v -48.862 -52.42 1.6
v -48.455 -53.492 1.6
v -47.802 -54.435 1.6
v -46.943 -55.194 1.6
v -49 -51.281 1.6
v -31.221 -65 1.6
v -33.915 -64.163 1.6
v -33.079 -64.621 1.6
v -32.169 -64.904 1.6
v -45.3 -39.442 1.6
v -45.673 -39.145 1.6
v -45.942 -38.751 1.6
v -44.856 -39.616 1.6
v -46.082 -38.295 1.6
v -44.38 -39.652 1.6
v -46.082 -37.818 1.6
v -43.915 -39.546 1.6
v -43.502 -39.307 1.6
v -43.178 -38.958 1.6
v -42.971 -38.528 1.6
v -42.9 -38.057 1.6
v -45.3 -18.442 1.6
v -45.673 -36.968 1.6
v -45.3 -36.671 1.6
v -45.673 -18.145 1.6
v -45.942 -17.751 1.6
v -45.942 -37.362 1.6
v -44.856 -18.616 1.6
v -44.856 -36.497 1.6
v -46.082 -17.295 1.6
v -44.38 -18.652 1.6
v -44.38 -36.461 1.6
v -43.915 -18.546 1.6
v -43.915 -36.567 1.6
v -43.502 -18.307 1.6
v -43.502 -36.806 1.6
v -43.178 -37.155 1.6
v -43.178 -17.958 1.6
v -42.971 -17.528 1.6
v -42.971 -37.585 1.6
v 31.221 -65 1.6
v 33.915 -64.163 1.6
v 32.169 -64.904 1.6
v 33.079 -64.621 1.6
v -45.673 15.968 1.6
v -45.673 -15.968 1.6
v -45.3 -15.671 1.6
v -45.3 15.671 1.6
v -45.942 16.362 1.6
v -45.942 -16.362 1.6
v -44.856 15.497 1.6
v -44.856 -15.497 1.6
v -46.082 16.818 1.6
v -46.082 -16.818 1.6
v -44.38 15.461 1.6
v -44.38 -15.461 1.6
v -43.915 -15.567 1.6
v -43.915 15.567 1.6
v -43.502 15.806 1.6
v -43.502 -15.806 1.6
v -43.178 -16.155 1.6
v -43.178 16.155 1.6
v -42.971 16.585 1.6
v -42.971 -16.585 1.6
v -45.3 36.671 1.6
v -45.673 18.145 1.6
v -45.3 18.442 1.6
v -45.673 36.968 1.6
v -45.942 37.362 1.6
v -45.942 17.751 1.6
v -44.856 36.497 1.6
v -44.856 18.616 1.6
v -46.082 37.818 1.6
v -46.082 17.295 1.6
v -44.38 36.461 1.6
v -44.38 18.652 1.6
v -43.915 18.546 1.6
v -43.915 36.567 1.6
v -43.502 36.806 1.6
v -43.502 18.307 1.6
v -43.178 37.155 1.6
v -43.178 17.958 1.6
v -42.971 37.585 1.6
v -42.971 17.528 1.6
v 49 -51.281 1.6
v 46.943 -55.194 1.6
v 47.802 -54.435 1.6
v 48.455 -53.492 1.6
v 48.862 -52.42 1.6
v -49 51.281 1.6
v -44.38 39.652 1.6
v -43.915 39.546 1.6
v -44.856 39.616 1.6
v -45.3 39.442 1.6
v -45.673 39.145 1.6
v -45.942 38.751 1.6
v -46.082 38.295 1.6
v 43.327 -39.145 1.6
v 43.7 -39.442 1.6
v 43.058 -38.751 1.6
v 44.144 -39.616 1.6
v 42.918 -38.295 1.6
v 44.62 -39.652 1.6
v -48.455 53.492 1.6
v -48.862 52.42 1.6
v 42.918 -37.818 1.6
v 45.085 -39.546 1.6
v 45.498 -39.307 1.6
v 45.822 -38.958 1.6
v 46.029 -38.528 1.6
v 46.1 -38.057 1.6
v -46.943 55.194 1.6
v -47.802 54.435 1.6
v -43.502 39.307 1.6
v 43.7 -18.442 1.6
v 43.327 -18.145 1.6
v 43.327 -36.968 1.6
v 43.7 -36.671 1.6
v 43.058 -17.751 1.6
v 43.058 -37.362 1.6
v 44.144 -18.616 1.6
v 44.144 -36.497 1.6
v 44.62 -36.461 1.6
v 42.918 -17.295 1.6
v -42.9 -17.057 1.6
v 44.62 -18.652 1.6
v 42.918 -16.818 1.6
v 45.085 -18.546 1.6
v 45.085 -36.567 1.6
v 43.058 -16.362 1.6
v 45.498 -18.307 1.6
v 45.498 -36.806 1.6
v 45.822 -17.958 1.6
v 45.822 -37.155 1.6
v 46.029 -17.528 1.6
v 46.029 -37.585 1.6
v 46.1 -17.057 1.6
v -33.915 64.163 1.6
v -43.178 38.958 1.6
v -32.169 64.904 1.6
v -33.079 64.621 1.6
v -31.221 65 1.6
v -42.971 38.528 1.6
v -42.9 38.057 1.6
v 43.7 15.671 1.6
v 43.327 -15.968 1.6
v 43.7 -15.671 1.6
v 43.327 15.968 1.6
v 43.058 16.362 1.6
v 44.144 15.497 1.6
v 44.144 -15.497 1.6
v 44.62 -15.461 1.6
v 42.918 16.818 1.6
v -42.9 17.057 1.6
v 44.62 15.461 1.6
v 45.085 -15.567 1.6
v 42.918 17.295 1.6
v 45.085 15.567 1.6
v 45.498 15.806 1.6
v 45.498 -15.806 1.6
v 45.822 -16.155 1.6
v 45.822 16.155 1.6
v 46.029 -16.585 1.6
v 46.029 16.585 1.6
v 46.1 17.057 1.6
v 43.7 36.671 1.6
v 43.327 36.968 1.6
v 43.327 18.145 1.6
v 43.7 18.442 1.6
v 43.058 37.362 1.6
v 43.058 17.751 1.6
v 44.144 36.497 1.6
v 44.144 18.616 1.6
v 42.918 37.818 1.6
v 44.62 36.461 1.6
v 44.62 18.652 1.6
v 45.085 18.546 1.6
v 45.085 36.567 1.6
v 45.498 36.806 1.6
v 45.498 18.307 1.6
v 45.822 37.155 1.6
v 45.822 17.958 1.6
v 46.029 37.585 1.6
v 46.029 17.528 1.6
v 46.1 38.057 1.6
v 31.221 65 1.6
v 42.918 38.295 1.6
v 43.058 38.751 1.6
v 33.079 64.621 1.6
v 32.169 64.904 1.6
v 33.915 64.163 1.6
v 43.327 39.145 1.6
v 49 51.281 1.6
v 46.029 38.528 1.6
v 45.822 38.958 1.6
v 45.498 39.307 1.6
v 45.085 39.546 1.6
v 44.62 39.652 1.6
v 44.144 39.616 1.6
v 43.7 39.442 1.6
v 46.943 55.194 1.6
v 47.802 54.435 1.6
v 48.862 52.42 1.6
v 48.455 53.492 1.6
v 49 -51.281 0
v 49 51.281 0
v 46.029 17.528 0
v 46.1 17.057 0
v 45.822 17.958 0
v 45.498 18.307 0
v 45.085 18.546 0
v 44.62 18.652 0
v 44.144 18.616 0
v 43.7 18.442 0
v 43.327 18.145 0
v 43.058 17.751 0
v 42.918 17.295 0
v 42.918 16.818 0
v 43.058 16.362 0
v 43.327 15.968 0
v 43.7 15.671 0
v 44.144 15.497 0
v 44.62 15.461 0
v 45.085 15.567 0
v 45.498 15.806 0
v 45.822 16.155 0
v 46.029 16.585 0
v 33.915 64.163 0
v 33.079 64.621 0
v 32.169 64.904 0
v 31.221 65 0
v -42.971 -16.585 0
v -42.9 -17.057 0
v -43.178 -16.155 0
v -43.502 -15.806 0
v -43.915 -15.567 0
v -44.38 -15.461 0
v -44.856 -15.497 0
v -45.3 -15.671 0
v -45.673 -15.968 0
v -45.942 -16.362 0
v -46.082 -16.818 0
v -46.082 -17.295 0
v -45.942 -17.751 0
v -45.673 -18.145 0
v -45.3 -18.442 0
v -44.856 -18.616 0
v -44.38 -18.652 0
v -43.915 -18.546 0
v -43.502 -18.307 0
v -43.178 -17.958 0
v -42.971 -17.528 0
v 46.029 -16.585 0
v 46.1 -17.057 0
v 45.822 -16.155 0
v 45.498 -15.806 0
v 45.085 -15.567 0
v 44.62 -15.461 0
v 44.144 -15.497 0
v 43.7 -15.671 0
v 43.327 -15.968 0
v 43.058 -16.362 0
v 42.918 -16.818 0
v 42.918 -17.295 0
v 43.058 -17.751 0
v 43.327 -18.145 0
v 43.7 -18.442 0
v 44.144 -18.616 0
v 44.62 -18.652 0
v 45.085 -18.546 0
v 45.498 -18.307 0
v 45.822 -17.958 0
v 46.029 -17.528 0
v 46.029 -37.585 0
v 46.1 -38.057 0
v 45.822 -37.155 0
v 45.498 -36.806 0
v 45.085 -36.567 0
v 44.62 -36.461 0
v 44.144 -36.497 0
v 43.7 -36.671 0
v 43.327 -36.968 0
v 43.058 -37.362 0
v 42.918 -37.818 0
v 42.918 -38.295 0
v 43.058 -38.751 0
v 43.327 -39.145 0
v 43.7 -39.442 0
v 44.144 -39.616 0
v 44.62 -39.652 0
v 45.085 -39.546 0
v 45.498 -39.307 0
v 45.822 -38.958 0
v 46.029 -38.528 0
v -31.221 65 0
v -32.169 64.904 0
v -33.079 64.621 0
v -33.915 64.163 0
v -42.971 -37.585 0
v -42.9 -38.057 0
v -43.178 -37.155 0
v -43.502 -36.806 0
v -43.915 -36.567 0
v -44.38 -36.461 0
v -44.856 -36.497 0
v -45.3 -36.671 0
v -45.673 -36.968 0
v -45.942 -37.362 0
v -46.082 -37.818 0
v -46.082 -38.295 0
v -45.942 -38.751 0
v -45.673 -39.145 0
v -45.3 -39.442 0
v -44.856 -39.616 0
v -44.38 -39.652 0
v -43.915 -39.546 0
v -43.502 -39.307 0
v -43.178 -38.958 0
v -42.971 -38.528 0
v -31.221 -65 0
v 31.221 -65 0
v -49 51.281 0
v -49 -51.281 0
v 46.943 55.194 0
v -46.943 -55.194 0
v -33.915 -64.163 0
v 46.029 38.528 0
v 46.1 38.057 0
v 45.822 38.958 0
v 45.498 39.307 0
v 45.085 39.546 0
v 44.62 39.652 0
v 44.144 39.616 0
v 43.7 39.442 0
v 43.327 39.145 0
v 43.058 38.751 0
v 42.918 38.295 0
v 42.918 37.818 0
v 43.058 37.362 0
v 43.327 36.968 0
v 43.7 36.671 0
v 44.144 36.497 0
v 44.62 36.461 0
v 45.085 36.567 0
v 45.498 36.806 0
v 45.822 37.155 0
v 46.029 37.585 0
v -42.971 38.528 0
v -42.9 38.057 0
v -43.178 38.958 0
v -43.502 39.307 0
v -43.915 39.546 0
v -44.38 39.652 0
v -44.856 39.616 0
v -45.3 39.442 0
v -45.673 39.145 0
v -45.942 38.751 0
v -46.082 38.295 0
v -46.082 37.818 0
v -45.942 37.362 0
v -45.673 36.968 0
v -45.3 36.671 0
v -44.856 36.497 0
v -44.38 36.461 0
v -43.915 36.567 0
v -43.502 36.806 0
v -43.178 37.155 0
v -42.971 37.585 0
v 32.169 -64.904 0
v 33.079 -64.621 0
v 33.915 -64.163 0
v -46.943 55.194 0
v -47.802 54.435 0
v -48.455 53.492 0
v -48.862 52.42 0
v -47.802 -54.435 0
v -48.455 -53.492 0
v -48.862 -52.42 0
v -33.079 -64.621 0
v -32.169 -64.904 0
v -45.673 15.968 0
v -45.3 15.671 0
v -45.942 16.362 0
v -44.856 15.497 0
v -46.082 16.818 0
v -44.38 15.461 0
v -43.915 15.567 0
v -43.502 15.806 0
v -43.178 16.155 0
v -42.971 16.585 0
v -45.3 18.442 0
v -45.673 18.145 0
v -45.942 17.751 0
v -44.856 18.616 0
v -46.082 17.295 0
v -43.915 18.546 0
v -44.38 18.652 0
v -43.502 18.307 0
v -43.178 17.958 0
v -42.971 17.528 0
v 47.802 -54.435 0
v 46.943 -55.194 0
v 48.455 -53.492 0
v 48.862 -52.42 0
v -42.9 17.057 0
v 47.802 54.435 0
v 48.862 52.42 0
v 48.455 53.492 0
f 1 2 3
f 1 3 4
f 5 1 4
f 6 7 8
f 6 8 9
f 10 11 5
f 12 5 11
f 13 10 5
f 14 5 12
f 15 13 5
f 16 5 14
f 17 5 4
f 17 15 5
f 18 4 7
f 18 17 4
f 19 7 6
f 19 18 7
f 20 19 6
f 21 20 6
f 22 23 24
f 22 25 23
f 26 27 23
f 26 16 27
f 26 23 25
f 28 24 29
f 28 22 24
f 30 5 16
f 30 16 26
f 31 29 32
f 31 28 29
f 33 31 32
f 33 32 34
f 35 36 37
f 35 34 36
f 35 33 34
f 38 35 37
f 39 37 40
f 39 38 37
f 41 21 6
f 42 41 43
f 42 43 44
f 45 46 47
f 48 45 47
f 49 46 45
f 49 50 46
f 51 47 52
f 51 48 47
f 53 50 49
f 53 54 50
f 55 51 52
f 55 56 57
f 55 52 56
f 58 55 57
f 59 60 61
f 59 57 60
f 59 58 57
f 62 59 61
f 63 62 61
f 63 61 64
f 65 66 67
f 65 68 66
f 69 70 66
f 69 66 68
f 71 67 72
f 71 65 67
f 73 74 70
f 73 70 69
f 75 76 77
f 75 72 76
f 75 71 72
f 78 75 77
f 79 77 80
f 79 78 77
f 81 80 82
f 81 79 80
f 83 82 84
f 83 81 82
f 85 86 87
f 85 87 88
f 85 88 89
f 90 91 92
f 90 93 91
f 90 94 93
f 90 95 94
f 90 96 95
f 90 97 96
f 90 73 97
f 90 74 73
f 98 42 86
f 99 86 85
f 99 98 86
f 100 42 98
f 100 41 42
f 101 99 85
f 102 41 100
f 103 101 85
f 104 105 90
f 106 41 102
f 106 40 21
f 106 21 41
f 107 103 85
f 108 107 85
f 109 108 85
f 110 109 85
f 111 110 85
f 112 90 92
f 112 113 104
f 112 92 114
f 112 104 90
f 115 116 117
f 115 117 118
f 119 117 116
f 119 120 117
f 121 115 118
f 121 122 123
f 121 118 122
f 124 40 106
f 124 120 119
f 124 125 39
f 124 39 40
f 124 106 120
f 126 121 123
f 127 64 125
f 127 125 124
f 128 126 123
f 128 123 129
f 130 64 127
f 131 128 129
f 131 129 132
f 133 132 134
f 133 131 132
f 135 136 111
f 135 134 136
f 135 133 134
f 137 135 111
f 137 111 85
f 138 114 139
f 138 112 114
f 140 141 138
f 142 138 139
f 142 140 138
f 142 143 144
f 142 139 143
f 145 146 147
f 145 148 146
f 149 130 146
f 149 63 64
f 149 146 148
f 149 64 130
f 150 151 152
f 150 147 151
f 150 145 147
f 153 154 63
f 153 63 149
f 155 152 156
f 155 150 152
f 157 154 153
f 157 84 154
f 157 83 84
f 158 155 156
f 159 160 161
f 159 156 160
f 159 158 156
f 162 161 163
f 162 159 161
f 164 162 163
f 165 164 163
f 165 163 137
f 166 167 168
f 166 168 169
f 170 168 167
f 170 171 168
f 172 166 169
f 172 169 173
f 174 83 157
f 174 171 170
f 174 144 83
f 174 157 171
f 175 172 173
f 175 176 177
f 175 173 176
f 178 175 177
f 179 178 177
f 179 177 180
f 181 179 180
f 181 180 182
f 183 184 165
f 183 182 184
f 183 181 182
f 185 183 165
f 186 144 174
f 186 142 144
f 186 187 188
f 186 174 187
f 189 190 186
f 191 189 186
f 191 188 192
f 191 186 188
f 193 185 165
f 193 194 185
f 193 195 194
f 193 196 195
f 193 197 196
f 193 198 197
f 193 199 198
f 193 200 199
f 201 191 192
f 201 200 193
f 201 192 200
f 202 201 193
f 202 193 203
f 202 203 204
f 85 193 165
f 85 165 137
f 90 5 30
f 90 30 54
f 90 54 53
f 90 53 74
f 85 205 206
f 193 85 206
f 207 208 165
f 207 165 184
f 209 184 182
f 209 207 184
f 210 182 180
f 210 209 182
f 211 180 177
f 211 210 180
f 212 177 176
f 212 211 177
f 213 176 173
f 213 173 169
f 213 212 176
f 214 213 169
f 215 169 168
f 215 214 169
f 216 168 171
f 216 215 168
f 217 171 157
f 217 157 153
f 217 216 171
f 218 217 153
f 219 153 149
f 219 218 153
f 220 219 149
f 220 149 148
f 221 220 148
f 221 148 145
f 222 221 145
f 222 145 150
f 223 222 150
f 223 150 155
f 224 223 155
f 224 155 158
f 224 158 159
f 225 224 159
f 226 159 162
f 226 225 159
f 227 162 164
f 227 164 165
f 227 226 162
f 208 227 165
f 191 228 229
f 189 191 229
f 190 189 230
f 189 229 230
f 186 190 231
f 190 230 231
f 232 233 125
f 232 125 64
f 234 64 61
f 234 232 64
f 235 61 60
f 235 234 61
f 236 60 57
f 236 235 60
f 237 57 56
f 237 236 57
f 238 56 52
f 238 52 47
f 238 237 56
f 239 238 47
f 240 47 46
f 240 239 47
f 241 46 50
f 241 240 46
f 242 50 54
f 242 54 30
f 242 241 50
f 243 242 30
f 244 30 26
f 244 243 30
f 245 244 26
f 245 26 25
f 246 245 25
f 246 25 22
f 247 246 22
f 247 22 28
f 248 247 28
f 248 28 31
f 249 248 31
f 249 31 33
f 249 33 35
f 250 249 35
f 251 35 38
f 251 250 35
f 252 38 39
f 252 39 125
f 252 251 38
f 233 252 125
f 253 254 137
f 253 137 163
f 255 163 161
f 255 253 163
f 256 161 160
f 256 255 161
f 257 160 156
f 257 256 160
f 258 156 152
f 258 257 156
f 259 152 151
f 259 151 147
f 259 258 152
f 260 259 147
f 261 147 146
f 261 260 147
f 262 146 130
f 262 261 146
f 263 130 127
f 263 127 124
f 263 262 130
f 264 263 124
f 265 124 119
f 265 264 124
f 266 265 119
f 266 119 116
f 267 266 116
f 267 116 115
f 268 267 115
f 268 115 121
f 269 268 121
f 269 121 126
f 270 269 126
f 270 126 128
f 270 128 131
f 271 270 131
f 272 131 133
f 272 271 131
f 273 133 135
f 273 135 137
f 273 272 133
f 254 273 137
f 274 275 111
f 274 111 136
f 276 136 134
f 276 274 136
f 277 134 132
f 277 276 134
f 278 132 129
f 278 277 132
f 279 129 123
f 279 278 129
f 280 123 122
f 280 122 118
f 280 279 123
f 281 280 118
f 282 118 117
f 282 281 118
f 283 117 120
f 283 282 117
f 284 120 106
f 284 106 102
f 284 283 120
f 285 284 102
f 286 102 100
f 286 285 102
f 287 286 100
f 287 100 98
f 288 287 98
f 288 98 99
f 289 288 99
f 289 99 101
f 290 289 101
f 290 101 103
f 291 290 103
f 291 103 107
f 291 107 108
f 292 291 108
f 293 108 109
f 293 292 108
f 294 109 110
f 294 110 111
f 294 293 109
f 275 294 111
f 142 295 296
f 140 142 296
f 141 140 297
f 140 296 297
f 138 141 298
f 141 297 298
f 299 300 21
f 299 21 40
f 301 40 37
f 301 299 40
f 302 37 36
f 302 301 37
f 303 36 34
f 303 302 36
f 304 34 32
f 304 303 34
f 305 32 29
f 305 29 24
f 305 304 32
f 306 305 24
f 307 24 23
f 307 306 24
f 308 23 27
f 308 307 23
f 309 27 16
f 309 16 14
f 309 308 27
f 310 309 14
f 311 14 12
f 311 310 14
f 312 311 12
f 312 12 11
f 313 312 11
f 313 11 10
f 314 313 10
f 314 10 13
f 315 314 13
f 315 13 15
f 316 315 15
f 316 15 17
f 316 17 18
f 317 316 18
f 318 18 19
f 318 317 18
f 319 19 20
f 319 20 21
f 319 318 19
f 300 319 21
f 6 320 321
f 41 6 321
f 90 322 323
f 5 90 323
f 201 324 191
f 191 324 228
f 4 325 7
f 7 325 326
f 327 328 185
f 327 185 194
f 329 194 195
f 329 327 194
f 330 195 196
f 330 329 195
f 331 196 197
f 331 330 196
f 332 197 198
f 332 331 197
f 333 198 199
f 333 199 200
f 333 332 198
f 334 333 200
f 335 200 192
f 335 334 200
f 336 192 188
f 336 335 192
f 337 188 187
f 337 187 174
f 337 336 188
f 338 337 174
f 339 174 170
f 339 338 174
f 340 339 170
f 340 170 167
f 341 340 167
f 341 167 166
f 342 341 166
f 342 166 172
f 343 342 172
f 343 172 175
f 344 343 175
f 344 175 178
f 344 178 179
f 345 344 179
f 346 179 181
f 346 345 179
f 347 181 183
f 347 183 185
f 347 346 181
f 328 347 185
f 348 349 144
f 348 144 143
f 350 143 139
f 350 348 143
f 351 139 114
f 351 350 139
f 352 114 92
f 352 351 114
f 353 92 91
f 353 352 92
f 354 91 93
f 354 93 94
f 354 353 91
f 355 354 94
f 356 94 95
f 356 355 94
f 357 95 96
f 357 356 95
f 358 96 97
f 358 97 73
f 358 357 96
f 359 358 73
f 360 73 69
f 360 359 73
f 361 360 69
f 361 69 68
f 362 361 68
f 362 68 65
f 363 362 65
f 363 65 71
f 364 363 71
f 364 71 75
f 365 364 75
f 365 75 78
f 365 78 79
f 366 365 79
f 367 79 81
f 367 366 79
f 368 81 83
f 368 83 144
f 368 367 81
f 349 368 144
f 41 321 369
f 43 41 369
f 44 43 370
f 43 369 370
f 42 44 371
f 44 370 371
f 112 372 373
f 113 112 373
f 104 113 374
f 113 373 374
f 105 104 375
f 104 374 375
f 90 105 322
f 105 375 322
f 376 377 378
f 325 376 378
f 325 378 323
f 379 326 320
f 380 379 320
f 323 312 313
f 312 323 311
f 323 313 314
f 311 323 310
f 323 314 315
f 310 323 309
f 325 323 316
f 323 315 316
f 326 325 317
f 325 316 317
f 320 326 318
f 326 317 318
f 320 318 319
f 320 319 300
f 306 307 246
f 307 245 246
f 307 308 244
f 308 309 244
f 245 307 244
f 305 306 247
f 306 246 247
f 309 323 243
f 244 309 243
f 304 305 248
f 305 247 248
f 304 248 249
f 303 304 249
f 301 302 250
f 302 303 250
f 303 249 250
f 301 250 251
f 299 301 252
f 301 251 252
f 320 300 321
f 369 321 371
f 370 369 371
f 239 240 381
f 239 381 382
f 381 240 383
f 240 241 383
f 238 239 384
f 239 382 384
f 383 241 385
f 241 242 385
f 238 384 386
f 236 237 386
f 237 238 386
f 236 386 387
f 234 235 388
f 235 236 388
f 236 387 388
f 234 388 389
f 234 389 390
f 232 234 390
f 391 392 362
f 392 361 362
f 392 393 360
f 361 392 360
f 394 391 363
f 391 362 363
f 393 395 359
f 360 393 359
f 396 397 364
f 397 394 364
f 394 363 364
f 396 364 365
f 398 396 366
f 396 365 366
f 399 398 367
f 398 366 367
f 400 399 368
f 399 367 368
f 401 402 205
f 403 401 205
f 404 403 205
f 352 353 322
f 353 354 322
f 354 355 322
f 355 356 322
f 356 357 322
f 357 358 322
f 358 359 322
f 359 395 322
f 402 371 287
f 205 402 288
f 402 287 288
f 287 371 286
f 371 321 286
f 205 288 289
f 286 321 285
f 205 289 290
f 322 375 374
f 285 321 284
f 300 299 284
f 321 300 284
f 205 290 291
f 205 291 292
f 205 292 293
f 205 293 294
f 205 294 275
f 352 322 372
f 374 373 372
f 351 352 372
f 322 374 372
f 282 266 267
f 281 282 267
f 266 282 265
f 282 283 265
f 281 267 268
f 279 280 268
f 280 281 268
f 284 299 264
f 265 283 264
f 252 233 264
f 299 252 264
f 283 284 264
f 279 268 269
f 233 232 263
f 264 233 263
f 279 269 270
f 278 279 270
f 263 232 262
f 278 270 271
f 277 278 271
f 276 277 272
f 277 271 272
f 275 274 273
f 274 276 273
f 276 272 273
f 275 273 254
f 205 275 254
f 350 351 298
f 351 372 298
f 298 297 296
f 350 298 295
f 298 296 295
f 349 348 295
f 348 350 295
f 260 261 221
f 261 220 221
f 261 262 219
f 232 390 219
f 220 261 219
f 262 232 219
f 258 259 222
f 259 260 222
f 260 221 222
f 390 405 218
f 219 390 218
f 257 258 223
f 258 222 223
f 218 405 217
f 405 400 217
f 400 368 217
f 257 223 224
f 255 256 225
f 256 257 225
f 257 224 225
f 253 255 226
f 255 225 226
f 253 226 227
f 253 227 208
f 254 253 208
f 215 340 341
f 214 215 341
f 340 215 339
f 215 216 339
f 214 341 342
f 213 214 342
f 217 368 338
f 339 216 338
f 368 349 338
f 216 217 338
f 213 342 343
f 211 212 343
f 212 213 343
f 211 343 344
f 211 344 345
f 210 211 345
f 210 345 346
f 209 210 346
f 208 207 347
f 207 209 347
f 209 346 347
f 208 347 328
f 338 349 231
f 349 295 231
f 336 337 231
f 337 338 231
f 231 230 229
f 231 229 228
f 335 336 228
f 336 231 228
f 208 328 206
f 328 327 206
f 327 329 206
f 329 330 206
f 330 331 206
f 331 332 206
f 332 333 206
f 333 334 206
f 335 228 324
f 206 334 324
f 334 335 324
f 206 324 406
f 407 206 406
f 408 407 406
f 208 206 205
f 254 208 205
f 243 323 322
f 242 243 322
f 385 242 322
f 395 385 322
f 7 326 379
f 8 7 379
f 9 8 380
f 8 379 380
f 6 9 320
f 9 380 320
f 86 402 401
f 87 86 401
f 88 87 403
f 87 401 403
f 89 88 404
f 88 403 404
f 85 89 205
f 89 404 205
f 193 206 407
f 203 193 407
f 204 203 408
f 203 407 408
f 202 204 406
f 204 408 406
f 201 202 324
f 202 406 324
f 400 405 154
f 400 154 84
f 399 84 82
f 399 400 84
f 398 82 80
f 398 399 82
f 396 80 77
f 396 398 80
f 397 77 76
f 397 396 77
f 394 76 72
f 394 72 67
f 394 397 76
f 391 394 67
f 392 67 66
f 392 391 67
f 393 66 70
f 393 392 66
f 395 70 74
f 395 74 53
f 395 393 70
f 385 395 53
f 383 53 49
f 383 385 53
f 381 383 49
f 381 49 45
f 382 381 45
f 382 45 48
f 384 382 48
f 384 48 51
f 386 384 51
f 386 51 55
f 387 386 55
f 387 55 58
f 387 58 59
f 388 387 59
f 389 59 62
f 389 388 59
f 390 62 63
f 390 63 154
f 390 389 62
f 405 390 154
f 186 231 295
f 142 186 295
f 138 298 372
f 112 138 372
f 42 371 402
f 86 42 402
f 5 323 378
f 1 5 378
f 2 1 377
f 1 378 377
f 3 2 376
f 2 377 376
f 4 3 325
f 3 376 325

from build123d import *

# Parameters (mm, degrees)
SKETCH_1_R      = 1.6
EXTRUDE_1_DEPTH = 1.6


with BuildPart() as part:
    # Эскиз1 → Бобышка-Вытянуть1 (new body)
    with BuildSketch(Plane.XY):
        with BuildLine():
            Line((33.914602025, -64.162611141), (46.943320266, -55.194045236))
            ThreePointArc((46.943320266, -55.194045236), (48.454507775, -53.491550465), (49, -51.281434095))
            Line((49, -51.281434095), (49, 51.281434095))
            ThreePointArc((49, 51.281434095), (48.454507775, 53.491550465), (46.943320266, 55.194045236))
            Line((46.943320266, 55.194045236), (33.914602025, 64.162611141))
            ThreePointArc((33.914602025, 64.162611141), (32.631529446, 64.785824232), (31.221281759, 65))
            Line((31.221281759, 65), (-31.221281759, 65))
            ThreePointArc((-31.221281759, 65), (-32.631529446, 64.785824232), (-33.914602025, 64.162611141))
            Line((-33.914602025, 64.162611141), (-46.943320266, 55.194045236))
            ThreePointArc((-46.943320266, 55.194045236), (-48.454507775, 53.491550465), (-49, 51.281434095))
            Line((-49, 51.281434095), (-49, -51.281434095))
            ThreePointArc((-49, -51.281434095), (-48.454507775, -53.491550465), (-46.943320266, -55.194045236))
            Line((-46.943320266, -55.194045236), (-33.914602025, -64.162611141))
            ThreePointArc((-33.914602025, -64.162611141), (-32.631529446, -64.785824232), (-31.221281759, -65))
            Line((-31.221281759, -65), (31.221281759, -65))
            ThreePointArc((31.221281759, -65), (32.631529446, -64.785824232), (33.914602025, -64.162611141))
        make_face()
        with Locations((44.5, 17.056509603)):
            Circle(SKETCH_1_R, mode=Mode.SUBTRACT)
        with Locations((-44.5, -17.056509603)):
            Circle(SKETCH_1_R, mode=Mode.SUBTRACT)
        with Locations((-44.5, 17.056509603)):
            Circle(SKETCH_1_R, mode=Mode.SUBTRACT)
        with Locations((-44.5, 38.056509603)):
            Circle(SKETCH_1_R, mode=Mode.SUBTRACT)
        with Locations((-44.5, -38.056509603)):
            Circle(SKETCH_1_R, mode=Mode.SUBTRACT)
        with Locations((44.5, -17.056509603)):
            Circle(SKETCH_1_R, mode=Mode.SUBTRACT)
        with Locations((44.5, -38.056509603)):
            Circle(SKETCH_1_R, mode=Mode.SUBTRACT)
        with Locations((44.5, 38.056509603)):
            Circle(SKETCH_1_R, mode=Mode.SUBTRACT)
    extrude(amount=EXTRUDE_1_DEPTH)


solid = part.part
